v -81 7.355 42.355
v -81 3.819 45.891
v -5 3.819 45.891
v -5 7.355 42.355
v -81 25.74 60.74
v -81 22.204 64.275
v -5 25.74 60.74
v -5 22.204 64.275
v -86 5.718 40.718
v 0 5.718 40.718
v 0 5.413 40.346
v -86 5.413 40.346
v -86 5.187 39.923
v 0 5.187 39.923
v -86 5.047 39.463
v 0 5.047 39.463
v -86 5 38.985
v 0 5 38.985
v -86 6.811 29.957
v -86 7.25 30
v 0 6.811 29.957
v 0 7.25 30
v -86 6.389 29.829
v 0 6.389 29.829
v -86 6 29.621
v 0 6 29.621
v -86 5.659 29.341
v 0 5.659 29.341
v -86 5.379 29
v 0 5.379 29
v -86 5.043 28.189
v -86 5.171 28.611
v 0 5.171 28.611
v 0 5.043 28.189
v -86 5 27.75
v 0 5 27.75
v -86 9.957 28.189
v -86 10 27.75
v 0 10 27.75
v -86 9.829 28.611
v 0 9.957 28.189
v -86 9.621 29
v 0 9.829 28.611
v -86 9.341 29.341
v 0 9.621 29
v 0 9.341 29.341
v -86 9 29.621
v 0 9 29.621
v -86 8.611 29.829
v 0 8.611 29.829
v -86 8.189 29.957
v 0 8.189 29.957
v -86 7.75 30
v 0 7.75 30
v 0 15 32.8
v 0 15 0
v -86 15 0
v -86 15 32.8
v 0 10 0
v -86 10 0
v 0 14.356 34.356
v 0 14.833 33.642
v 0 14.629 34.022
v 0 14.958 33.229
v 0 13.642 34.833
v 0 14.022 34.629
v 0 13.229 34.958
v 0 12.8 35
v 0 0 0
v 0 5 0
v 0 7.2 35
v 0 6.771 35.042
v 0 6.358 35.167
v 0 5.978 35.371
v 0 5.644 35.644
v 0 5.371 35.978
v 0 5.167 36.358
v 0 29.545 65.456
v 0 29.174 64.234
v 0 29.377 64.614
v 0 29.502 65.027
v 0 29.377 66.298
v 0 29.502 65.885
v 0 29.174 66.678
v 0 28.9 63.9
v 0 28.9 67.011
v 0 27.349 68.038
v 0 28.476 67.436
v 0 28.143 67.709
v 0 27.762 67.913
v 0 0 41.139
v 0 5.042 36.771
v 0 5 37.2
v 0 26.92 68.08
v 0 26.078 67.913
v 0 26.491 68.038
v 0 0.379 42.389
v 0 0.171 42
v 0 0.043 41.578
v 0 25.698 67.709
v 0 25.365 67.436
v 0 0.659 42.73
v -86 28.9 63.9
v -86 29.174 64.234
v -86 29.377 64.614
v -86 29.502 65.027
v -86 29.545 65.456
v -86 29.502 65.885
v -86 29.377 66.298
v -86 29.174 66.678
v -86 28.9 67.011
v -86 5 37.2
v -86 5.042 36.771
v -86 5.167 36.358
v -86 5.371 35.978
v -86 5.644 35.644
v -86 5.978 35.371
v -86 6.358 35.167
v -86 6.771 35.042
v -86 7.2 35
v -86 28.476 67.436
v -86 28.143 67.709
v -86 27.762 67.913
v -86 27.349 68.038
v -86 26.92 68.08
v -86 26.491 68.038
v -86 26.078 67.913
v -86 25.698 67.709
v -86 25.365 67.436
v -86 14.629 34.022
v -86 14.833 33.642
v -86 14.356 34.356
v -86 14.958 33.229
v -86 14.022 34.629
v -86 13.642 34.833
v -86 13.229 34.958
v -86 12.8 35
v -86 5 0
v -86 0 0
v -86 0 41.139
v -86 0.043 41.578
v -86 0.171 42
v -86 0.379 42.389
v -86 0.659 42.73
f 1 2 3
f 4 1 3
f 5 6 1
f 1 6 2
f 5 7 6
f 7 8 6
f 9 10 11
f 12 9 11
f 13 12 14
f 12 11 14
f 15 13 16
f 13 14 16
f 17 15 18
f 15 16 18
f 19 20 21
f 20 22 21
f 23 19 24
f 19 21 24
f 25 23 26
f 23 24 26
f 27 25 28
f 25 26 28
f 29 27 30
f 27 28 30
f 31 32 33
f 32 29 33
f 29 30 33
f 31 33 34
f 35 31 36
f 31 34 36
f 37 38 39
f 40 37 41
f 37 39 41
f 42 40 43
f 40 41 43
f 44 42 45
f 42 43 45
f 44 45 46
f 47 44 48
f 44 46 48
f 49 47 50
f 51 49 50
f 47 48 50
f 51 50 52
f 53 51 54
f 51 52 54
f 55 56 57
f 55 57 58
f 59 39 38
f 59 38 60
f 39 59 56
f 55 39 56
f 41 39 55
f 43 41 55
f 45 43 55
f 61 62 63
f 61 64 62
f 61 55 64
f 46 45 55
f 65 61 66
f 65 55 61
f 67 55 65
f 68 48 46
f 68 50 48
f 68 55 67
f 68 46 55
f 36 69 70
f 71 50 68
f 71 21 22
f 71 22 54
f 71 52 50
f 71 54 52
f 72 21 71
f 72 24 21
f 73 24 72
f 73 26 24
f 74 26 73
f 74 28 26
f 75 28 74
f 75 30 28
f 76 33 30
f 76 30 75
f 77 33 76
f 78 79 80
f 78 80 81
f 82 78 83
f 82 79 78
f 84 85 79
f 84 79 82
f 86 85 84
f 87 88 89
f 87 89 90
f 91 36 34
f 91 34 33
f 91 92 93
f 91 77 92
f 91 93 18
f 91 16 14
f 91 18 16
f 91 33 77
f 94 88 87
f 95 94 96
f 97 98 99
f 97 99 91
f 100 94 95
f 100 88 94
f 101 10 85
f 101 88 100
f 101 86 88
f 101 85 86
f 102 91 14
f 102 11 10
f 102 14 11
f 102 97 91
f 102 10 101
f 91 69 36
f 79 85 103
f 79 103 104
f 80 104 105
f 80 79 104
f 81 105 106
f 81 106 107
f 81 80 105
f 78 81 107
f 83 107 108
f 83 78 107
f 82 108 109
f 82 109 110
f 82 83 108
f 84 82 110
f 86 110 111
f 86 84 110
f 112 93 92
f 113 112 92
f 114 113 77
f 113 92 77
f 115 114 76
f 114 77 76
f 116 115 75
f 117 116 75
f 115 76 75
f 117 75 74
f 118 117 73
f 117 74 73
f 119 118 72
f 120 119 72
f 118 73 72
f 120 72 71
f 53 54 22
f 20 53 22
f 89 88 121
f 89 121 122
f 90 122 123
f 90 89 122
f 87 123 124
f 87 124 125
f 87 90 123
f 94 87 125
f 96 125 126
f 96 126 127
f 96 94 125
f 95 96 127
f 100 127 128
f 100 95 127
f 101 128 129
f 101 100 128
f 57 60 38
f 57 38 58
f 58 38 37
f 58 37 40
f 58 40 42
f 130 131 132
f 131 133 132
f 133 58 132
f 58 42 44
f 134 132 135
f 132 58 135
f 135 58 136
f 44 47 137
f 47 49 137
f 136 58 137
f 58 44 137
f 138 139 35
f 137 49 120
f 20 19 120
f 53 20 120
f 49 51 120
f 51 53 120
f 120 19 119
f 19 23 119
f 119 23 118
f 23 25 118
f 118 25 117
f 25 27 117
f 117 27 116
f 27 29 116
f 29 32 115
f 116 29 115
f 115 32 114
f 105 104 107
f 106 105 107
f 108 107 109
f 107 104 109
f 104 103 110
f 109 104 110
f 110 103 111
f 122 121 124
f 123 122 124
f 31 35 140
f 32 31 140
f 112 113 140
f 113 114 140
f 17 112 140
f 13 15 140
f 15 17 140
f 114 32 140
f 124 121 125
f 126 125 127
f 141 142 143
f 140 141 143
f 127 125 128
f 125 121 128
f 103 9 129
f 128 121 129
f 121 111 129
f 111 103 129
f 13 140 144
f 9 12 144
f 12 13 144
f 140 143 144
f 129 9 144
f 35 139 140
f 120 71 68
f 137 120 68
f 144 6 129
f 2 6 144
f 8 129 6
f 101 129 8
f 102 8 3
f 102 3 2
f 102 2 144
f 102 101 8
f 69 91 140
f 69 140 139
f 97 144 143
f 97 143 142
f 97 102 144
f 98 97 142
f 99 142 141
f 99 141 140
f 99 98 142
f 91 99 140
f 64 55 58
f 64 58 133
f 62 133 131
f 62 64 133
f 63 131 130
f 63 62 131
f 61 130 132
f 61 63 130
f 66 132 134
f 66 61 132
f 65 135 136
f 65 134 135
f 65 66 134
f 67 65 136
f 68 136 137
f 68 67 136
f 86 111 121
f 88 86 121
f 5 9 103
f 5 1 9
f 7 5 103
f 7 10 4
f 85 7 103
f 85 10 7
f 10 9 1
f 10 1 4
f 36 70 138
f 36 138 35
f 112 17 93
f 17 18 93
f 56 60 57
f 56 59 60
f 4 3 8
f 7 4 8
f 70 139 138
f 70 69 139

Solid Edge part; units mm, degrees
sketch "Sketch1" plane through (0, 0, 0) normal (1, 0, 0) x (0, 1, 0)
  arc A0 (28.4759, 67.4357) -> (25.3647, 67.4357) centre (26.9203, 65.8801) ccw
  line L0 (25.3647, 67.4357) -> (0.659, 42.7301)
  arc A1 (0.659, 42.7301) -> (0, 41.1391) centre (2.25, 41.1391) ccw
  line L1 (0, 41.1391) -> (0, 40)
  line L2 (0, 40) -> (0, 0)
  line L3 (0, 0) -> (5, 0)
  line L4 (5, 0) -> (5, 27.75)
  arc A2 (5, 27.75) -> (7.25, 30) centre (7.25, 27.75) cw
  line L5 (7.75, 30) -> (7.25, 30)
  arc A3 (10, 27.75) -> (7.75, 30) centre (7.75, 27.75) ccw
  line L6 (10, 27.75) -> (10, 0)
  line L7 (10, 0) -> (15, 0)
  line L8 (15, 0) -> (15, 32.8)
  arc A4 (12.8, 35) -> (15, 32.8) centre (12.8, 32.8) cw
  line L9 (7.2, 35) -> (12.8, 35)
  line L10 (7.2, 35) -> (10, 35)
  arc A5 (5, 37.2) -> (7.2, 35) centre (7.2, 37.2) ccw
  line L11 (5, 38.985) -> (5, 37.2)
  arc A6 (5.7177, 40.7177) -> (5, 38.985) centre (7.4505, 38.985) ccw
  line L12 (5.7177, 40.7177) -> (28.9002, 63.9002)
  arc A7 (28.9002, 63.9002) -> (28.9002, 67.0115) centre (27.3446, 65.4558) ccw
  line L13 (28.9002, 67.0115) -> (28.4759, 67.4357)
extrude "Protrusion1" add sketch "Sketch1" against normal blind 86 material side at (0, 26.9203, 68.1301)
sketch "Sketch2" plane through (-43, 13.0118, 55.0829) normal (0, -0.7071068, 0.7071068) x (1, 0, 0)
  line L0 (38, -13) -> (38, 13)
  line L1 (38, 13) -> (-38, 13)
  line L2 (-38, 13) -> (-38, -13)
  line L3 (-38, -13) -> (38, -13)
extrude "Cutout1" cut sketch "Sketch2" against normal blind 5
